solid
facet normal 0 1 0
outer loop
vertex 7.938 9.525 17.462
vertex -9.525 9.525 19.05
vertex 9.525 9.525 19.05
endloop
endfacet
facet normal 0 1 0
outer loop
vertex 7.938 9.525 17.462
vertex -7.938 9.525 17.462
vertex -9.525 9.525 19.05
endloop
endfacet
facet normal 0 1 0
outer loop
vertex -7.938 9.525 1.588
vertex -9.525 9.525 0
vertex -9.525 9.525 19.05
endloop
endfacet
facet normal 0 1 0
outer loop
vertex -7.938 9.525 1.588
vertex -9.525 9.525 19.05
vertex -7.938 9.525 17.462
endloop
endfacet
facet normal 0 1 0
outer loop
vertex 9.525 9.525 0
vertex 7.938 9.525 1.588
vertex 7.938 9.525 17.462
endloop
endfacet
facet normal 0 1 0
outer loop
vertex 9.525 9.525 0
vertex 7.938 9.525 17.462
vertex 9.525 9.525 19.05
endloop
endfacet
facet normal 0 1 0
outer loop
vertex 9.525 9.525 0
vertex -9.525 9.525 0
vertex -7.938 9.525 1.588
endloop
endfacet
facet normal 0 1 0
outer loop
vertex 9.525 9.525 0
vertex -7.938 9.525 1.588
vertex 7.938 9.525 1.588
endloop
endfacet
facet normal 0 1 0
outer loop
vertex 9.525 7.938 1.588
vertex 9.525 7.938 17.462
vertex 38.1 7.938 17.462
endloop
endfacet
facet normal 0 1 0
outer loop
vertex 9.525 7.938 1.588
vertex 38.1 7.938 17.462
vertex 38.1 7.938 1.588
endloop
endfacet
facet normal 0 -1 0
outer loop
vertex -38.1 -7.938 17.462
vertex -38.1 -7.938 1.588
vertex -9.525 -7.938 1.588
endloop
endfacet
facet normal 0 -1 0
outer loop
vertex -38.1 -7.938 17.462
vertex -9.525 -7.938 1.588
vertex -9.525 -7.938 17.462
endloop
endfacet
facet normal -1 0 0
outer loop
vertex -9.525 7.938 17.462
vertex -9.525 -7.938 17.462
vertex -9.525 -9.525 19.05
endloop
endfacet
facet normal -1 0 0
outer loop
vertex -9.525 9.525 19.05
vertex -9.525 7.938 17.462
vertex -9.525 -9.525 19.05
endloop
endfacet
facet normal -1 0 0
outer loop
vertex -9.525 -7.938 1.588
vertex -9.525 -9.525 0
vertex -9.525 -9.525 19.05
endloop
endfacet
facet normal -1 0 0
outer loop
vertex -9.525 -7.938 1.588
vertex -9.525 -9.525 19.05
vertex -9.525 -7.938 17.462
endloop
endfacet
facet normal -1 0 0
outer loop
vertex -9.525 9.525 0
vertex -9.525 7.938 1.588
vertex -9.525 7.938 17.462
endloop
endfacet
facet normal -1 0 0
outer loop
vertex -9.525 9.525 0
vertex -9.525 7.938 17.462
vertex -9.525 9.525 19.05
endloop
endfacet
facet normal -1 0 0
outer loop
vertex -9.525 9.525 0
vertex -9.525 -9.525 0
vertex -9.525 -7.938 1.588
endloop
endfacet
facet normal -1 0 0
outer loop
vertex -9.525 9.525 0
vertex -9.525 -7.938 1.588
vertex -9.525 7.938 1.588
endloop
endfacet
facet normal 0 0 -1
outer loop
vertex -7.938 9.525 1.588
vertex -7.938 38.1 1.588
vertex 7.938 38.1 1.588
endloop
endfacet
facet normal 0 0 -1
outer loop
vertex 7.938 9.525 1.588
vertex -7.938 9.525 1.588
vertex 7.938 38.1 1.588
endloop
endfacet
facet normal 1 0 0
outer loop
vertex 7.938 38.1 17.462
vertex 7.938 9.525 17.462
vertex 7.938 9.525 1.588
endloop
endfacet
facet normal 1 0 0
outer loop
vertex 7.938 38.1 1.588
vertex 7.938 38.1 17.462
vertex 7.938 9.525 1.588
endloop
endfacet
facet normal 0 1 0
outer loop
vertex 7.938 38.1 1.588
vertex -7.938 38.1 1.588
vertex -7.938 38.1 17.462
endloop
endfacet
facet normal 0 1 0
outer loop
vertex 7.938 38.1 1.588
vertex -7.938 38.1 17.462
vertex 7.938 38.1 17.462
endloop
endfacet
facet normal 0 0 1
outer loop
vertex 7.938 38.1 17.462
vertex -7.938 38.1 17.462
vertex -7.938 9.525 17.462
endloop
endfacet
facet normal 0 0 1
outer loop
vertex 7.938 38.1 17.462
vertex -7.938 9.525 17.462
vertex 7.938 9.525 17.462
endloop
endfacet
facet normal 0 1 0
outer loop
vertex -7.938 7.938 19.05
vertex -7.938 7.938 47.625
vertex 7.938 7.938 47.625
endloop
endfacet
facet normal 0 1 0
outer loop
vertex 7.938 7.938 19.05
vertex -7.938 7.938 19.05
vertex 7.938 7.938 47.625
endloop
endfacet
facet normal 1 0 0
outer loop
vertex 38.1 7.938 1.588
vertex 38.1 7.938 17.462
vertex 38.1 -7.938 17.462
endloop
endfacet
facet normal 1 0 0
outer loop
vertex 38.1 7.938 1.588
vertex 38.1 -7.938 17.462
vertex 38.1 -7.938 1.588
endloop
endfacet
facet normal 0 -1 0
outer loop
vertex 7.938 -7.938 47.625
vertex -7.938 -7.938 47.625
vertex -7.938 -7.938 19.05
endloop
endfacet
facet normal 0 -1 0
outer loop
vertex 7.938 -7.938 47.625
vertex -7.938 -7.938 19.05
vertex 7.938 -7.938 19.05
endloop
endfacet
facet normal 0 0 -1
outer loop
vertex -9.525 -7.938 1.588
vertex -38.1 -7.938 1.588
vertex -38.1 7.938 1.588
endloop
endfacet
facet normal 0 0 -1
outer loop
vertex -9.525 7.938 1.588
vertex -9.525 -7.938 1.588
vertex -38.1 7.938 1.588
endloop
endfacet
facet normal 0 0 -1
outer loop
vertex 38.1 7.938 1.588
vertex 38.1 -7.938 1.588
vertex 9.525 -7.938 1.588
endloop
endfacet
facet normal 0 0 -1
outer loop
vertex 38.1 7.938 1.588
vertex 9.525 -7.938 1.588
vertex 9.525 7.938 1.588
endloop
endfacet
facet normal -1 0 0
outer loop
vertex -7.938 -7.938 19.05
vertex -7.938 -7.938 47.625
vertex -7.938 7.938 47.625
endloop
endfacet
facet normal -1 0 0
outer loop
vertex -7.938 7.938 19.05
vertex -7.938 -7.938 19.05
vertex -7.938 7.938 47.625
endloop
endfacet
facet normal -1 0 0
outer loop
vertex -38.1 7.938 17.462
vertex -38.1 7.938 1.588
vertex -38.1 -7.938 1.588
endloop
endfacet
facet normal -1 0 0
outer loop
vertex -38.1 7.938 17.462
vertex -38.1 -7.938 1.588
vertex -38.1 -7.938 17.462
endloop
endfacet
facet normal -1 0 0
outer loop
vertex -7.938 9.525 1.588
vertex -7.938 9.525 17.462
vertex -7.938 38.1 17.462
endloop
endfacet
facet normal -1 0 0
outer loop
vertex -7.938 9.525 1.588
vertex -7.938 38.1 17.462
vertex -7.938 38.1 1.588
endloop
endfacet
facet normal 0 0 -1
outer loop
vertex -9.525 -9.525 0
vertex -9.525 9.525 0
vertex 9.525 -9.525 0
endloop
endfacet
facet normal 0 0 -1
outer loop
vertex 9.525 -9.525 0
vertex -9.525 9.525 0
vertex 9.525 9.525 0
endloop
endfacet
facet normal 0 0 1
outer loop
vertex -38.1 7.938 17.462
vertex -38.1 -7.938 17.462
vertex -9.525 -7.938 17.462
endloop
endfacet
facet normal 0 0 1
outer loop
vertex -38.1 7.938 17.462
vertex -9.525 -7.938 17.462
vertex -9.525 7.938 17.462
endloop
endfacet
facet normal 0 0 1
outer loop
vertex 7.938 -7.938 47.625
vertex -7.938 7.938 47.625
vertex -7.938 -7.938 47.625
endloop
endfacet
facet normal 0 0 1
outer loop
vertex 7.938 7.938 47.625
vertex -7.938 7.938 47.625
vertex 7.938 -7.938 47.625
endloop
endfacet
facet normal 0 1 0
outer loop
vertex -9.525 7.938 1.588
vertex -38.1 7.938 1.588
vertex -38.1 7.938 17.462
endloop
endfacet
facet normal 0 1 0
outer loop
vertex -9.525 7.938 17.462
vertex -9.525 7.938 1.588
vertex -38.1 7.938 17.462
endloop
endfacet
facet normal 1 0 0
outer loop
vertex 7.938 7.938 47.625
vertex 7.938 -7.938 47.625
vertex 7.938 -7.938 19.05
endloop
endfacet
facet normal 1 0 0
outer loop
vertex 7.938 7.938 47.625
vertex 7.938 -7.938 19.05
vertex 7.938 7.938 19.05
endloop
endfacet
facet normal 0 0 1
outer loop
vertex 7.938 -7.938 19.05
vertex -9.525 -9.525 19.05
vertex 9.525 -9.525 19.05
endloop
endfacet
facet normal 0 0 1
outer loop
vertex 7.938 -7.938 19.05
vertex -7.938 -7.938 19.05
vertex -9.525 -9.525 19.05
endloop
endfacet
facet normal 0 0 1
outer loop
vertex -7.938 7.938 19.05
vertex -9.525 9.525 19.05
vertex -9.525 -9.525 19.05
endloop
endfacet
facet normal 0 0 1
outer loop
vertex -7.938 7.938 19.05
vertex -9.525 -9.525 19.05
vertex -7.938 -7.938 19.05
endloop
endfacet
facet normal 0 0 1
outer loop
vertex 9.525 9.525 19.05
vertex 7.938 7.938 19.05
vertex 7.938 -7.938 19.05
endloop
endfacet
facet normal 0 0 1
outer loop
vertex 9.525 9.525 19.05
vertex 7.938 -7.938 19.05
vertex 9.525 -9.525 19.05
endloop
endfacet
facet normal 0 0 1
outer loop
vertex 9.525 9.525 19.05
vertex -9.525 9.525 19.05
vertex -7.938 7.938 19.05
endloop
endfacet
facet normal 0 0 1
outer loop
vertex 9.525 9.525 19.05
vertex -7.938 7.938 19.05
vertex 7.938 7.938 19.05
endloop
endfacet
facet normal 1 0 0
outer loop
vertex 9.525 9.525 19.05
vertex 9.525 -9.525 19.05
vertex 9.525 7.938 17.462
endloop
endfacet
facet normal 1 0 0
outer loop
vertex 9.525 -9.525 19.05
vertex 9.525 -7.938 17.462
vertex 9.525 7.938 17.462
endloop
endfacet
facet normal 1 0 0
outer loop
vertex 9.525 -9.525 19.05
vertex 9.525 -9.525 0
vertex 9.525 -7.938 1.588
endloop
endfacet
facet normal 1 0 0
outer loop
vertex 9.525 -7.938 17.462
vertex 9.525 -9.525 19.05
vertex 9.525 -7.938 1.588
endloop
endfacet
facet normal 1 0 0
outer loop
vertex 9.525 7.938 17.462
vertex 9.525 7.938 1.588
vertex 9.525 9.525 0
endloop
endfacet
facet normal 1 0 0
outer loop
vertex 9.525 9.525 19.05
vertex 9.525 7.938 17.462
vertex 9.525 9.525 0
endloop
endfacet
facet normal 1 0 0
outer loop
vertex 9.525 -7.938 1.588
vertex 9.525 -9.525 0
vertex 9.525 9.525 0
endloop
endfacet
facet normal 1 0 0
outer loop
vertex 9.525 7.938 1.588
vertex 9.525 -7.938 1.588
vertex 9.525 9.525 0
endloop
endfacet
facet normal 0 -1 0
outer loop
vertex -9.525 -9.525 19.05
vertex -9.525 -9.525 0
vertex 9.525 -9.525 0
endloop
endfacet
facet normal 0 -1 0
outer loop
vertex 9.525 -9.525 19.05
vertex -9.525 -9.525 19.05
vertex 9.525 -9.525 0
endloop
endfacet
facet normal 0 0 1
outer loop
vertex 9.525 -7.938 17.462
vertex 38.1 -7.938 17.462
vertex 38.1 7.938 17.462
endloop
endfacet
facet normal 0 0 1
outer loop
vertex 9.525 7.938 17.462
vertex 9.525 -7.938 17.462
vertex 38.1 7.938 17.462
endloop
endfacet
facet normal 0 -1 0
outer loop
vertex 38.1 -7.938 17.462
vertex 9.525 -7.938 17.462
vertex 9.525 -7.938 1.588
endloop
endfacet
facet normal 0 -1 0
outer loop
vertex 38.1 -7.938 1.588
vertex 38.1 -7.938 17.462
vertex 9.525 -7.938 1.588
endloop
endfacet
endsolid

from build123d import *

# Parameters (mm, degrees)
SKETCH1_W           = 19.05
SKETCH1_H           = 19.05
BOSS_EXTRUDE1_DEPTH = 19.05
SKETCH2_W           = 15.875
SKETCH2_H           = 15.875
BOSS_EXTRUDE2_DEPTH = 28.575
SKETCH3_W           = 15.875
SKETCH3_H           = 15.875
BOSS_EXTRUDE3_DEPTH = 28.575
SKETCH4_W           = 15.875
SKETCH4_H           = 15.875
BOSS_EXTRUDE4_DEPTH = 28.575
SKETCH5_W           = 15.875
SKETCH5_H           = 15.875
BOSS_EXTRUDE5_DEPTH = 28.575


with BuildPart() as part:
    # Sketch1 → Boss-Extrude1 (new body)
    with BuildSketch(Plane.XY):
        Rectangle(SKETCH1_W, SKETCH1_H)
    extrude(amount=BOSS_EXTRUDE1_DEPTH)

    # Sketch2 → Boss-Extrude2 (add)
    with BuildSketch(Plane(origin=(0, 9.525, 0), x_dir=(1, 0, 0), z_dir=(0, 1, 0))):
        with Locations((0, -9.525)):
            Rectangle(SKETCH2_W, SKETCH2_H)
    extrude(amount=BOSS_EXTRUDE2_DEPTH)

    # Sketch3 → Boss-Extrude3 (add)
    with BuildSketch(Plane(origin=(9.525, 0, 0), x_dir=(0, 0, -1), z_dir=(1, 0, 0))):
        with Locations((-9.525, 0)):
            Rectangle(SKETCH3_W, SKETCH3_H)
    extrude(amount=BOSS_EXTRUDE3_DEPTH)

    # Sketch4 → Boss-Extrude4 (add)
    with BuildSketch(Plane.XY.offset(19.05)):
        Rectangle(SKETCH4_W, SKETCH4_H)
    extrude(amount=BOSS_EXTRUDE4_DEPTH)

    # Sketch5 → Boss-Extrude5 (add)
    with BuildSketch(Plane.ZY.offset(9.525)):
        with Locations((9.525, 0)):
            Rectangle(SKETCH5_W, SKETCH5_H)
    extrude(amount=BOSS_EXTRUDE5_DEPTH)


solid = part.part
